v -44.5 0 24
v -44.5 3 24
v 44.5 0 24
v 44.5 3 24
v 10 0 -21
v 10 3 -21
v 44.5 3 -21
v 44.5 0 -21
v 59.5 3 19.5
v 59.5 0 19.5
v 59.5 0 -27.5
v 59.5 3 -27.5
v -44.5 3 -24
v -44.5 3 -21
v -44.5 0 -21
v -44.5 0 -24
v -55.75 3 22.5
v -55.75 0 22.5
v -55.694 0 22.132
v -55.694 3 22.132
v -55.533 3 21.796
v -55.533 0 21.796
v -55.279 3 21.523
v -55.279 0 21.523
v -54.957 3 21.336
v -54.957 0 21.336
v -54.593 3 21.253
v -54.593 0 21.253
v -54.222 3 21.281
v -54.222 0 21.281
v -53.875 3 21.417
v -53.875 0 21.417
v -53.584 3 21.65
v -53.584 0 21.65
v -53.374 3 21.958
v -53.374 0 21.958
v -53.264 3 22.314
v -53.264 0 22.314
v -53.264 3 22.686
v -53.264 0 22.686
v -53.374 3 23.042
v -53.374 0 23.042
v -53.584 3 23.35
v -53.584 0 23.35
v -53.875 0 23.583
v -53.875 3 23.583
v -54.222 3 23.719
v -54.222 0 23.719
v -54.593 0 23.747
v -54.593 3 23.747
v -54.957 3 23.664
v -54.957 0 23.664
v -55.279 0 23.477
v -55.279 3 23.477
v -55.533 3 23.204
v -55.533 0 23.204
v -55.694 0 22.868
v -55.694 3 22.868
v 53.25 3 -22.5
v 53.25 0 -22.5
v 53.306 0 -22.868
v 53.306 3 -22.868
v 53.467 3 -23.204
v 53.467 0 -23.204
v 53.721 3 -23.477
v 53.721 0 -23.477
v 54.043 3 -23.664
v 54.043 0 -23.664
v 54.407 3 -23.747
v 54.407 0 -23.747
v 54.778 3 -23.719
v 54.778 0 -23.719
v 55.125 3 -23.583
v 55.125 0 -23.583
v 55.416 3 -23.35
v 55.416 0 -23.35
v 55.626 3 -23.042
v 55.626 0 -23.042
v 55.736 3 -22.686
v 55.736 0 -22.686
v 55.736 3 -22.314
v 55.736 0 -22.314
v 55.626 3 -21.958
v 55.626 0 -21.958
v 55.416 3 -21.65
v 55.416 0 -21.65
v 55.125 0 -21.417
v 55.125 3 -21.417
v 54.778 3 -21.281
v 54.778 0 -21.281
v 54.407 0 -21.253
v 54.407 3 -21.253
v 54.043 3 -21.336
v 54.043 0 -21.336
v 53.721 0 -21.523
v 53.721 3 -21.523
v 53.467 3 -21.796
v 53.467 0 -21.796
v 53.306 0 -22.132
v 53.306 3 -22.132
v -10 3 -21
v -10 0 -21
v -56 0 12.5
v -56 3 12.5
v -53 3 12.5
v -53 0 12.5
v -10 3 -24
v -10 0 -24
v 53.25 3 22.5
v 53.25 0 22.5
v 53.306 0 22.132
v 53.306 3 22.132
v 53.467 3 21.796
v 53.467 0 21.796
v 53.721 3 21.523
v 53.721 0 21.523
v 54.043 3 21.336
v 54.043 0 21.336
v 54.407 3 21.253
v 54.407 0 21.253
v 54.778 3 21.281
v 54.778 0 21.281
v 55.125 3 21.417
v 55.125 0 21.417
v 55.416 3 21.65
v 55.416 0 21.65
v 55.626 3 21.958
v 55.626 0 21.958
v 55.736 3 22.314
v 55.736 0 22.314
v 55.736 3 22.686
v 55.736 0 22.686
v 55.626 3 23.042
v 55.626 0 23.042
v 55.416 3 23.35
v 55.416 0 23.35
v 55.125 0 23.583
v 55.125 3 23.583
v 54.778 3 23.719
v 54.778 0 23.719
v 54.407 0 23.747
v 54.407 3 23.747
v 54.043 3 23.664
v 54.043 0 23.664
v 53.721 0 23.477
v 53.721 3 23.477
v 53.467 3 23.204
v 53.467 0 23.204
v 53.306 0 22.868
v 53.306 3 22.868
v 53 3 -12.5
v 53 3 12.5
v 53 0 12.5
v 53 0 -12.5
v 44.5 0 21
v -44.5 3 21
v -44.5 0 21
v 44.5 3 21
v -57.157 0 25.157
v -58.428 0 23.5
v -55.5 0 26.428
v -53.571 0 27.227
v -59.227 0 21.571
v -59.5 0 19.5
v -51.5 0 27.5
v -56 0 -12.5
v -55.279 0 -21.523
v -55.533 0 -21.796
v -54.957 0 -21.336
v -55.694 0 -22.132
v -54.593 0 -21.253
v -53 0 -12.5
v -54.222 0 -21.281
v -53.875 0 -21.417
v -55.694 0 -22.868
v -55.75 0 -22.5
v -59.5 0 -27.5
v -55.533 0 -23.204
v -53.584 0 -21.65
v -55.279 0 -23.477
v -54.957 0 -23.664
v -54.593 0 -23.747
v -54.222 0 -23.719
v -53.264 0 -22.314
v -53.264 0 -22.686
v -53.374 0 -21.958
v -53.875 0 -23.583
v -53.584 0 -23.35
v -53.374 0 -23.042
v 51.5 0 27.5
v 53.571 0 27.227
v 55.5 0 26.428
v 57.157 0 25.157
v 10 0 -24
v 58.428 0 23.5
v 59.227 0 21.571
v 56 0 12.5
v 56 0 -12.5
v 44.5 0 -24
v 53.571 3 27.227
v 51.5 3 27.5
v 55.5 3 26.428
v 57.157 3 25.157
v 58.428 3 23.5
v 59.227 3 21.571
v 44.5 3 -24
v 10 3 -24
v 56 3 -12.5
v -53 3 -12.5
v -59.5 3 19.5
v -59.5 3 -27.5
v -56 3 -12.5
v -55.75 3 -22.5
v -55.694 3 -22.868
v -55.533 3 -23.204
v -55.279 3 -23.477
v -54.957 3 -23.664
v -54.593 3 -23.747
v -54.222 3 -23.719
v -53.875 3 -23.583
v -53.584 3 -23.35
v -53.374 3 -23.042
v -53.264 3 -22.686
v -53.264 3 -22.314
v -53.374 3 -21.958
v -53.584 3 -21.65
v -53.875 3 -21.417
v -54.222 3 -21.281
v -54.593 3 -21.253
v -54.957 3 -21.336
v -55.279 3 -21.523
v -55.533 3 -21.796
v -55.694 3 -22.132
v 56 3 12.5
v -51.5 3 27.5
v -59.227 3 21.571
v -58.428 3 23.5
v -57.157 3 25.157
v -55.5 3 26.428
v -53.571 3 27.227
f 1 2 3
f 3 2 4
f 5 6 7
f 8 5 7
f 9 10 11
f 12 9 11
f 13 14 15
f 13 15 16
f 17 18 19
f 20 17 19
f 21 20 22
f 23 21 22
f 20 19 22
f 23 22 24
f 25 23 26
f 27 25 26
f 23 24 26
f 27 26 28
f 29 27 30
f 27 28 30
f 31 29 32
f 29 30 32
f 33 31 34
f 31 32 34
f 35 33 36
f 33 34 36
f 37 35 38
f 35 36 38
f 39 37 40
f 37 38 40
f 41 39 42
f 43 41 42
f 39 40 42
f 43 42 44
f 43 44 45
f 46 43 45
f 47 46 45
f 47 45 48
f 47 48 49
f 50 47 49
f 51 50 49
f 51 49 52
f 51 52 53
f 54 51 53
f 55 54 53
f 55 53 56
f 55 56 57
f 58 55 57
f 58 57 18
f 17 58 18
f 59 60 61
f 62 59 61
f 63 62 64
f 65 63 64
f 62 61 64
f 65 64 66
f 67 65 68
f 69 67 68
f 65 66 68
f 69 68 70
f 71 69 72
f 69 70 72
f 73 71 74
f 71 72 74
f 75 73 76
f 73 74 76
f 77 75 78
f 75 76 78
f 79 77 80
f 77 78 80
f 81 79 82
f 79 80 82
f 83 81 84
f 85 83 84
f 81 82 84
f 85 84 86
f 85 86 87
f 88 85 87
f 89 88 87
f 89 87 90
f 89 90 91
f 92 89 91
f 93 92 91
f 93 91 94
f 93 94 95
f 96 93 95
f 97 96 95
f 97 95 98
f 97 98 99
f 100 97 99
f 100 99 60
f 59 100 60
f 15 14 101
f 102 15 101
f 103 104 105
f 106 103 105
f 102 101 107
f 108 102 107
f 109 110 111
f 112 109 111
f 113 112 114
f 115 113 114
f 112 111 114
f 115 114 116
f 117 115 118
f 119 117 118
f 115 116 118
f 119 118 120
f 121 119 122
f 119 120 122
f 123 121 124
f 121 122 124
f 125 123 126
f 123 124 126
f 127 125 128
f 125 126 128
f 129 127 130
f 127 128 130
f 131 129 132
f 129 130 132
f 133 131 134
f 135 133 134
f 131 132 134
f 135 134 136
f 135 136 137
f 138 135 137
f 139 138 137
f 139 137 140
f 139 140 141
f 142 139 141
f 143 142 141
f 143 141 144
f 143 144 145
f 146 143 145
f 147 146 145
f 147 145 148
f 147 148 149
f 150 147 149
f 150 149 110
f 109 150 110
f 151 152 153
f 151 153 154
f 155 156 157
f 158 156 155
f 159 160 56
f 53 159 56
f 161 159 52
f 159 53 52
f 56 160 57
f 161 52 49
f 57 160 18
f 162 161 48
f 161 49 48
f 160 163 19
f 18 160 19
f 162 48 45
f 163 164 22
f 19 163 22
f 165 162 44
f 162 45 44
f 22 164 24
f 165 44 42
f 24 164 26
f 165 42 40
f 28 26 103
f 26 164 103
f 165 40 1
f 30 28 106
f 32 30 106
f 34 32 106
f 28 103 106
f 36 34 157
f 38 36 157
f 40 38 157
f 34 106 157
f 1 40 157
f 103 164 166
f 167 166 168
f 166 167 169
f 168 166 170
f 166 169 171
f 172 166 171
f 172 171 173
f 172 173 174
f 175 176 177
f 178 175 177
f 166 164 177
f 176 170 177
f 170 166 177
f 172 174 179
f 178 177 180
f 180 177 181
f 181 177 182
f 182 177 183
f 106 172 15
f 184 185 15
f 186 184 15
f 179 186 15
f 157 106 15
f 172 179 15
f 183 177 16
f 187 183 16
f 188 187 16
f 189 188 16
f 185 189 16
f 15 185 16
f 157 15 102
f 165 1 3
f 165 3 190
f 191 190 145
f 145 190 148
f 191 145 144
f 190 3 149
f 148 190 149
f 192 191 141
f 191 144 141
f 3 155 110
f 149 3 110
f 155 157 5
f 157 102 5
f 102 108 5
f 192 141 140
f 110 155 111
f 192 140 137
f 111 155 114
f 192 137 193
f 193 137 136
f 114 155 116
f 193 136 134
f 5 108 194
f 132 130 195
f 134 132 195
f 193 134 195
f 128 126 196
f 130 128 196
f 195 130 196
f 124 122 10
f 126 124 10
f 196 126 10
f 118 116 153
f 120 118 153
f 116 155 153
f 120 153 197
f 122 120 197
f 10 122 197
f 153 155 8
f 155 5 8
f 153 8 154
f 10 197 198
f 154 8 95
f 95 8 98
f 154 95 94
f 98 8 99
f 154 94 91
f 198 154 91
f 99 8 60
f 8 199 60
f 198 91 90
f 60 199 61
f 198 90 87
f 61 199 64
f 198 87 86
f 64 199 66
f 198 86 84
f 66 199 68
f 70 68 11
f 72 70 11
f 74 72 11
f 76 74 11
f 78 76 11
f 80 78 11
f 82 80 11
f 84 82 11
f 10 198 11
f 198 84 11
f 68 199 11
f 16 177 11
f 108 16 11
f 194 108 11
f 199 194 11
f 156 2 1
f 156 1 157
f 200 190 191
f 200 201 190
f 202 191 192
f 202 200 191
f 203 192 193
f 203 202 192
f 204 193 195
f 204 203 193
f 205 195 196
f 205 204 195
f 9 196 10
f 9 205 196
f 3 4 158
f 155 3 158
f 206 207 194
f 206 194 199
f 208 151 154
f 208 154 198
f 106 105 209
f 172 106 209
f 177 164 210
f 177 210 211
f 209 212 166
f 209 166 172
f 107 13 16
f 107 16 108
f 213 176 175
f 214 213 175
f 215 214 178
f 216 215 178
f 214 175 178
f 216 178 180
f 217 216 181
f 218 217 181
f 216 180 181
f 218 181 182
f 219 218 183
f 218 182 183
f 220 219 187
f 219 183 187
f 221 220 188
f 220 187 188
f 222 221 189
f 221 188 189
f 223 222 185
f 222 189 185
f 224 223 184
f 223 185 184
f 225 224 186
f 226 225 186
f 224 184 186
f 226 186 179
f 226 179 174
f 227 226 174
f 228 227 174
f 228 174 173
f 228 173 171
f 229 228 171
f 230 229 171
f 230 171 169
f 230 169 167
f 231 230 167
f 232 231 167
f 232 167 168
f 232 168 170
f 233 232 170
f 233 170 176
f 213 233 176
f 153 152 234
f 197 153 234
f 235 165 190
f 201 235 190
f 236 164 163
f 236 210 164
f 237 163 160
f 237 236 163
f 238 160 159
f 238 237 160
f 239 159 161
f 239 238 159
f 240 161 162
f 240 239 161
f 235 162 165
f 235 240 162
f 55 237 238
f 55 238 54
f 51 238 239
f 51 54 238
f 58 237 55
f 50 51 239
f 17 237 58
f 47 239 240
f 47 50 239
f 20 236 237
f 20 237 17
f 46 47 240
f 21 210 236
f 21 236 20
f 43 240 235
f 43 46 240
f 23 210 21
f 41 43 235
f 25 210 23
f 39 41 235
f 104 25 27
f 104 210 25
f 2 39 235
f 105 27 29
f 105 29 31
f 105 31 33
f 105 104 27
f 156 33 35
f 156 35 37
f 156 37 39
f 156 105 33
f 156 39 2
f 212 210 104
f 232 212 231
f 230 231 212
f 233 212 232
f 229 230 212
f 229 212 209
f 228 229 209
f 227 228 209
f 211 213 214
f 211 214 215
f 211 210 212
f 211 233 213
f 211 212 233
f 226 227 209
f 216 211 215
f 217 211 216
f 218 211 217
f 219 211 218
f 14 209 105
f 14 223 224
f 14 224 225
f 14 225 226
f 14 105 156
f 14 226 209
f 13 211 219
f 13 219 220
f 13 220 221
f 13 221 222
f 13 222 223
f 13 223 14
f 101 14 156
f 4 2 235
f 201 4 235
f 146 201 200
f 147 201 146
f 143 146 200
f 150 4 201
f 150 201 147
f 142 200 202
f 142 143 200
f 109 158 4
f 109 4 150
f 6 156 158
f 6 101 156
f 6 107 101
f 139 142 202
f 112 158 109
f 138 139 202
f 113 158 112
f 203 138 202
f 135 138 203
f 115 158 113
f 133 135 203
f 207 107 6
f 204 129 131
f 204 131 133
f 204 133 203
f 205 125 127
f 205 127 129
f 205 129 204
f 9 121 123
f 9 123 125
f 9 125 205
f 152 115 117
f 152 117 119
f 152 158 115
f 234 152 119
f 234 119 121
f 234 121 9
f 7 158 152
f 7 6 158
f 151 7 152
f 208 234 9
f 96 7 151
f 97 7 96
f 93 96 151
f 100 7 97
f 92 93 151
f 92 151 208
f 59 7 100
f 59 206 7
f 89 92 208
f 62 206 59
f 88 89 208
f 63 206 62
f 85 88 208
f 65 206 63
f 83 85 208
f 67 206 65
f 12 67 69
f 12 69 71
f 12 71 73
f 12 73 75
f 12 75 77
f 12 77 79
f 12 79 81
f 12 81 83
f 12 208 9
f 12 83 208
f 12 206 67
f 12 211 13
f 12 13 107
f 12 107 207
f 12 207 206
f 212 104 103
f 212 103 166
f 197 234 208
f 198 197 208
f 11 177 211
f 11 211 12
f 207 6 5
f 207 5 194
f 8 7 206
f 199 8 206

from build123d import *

# Parameters (mm, degrees)
SCHIZZO1_W                   = 119
SCHIZZO1_H                   = 55
ESTRUSIONE_ESTRUSIONE1_DEPTH = 3
FORO_FILETTATO_M3X0_5_1_D    = 2.5
SCHIZZO4_W                   = 89
SCHIZZO4_H                   = 3
SCHIZZO4_W_2                 = 3
SCHIZZO4_H_2                 = 25
TAGLIO_ESTRUSIONE1_DEPTH     = 66.616308948
RACCORDO1_R                  = 8
SCHIZZO5_W                   = 34.5
SCHIZZO5_H                   = 3
TAGLIO_ESTRUSIONE2_DEPTH     = 10


with BuildPart() as part:
    # Schizzo1 → Estrusione-Estrusione1 (new body)
    with BuildSketch(Plane(origin=(0, 0, 0), x_dir=(1, 0, 0), z_dir=(0, 1, 0))):
        Rectangle(SCHIZZO1_W, SCHIZZO1_H)
    extrude(amount=ESTRUSIONE_ESTRUSIONE1_DEPTH)

    # Foro filettato M3x0.5-1 (through all)
    with Locations(Plane(origin=(0, 3, 0), x_dir=(1, 0, 0), z_dir=(0, 1, 0))):
        with Locations((-54.5, -22.5), (54.5, -22.5), (54.5, 22.5), (-54.5, 22.5)):
            Hole(FORO_FILETTATO_M3X0_5_1_D / 2)

    # Schizzo4 → Taglio-Estrusione1 (cut, through all)
    with BuildSketch(Plane(origin=(0, 3, 0), x_dir=(1, 0, 0), z_dir=(0, 1, 0))):
        with Locations((0, -22.5)):
            Rectangle(SCHIZZO4_W, SCHIZZO4_H)
        with Locations((54.5, 0)):
            Rectangle(SCHIZZO4_W_2, SCHIZZO4_H_2)
        with Locations((-54.5, 0)):
            Rectangle(SCHIZZO4_W_2, SCHIZZO4_H_2)
    extrude(amount=-TAGLIO_ESTRUSIONE1_DEPTH, mode=Mode.SUBTRACT)

    # Raccordo1
    raccordo1_edges = [part.edges().sort_by_distance(p)[0] for p in [
        (59.5, 1.5, 27.5),
        (-59.5, 1.5, 27.5),
    ]]
    fillet(raccordo1_edges, radius=RACCORDO1_R)

    # Schizzo5 → Taglio-Estrusione2 (cut)
    with BuildSketch(Plane(origin=(0, 3, 0), x_dir=(1, 0, 0), z_dir=(0, 1, 0))):
        with Locations((27.25, 22.5)):
            Rectangle(SCHIZZO5_W, SCHIZZO5_H)
        with Locations((-27.25, 22.5)):
            Rectangle(SCHIZZO5_W, SCHIZZO5_H)
    extrude(amount=-TAGLIO_ESTRUSIONE2_DEPTH, mode=Mode.SUBTRACT)


solid = part.part
